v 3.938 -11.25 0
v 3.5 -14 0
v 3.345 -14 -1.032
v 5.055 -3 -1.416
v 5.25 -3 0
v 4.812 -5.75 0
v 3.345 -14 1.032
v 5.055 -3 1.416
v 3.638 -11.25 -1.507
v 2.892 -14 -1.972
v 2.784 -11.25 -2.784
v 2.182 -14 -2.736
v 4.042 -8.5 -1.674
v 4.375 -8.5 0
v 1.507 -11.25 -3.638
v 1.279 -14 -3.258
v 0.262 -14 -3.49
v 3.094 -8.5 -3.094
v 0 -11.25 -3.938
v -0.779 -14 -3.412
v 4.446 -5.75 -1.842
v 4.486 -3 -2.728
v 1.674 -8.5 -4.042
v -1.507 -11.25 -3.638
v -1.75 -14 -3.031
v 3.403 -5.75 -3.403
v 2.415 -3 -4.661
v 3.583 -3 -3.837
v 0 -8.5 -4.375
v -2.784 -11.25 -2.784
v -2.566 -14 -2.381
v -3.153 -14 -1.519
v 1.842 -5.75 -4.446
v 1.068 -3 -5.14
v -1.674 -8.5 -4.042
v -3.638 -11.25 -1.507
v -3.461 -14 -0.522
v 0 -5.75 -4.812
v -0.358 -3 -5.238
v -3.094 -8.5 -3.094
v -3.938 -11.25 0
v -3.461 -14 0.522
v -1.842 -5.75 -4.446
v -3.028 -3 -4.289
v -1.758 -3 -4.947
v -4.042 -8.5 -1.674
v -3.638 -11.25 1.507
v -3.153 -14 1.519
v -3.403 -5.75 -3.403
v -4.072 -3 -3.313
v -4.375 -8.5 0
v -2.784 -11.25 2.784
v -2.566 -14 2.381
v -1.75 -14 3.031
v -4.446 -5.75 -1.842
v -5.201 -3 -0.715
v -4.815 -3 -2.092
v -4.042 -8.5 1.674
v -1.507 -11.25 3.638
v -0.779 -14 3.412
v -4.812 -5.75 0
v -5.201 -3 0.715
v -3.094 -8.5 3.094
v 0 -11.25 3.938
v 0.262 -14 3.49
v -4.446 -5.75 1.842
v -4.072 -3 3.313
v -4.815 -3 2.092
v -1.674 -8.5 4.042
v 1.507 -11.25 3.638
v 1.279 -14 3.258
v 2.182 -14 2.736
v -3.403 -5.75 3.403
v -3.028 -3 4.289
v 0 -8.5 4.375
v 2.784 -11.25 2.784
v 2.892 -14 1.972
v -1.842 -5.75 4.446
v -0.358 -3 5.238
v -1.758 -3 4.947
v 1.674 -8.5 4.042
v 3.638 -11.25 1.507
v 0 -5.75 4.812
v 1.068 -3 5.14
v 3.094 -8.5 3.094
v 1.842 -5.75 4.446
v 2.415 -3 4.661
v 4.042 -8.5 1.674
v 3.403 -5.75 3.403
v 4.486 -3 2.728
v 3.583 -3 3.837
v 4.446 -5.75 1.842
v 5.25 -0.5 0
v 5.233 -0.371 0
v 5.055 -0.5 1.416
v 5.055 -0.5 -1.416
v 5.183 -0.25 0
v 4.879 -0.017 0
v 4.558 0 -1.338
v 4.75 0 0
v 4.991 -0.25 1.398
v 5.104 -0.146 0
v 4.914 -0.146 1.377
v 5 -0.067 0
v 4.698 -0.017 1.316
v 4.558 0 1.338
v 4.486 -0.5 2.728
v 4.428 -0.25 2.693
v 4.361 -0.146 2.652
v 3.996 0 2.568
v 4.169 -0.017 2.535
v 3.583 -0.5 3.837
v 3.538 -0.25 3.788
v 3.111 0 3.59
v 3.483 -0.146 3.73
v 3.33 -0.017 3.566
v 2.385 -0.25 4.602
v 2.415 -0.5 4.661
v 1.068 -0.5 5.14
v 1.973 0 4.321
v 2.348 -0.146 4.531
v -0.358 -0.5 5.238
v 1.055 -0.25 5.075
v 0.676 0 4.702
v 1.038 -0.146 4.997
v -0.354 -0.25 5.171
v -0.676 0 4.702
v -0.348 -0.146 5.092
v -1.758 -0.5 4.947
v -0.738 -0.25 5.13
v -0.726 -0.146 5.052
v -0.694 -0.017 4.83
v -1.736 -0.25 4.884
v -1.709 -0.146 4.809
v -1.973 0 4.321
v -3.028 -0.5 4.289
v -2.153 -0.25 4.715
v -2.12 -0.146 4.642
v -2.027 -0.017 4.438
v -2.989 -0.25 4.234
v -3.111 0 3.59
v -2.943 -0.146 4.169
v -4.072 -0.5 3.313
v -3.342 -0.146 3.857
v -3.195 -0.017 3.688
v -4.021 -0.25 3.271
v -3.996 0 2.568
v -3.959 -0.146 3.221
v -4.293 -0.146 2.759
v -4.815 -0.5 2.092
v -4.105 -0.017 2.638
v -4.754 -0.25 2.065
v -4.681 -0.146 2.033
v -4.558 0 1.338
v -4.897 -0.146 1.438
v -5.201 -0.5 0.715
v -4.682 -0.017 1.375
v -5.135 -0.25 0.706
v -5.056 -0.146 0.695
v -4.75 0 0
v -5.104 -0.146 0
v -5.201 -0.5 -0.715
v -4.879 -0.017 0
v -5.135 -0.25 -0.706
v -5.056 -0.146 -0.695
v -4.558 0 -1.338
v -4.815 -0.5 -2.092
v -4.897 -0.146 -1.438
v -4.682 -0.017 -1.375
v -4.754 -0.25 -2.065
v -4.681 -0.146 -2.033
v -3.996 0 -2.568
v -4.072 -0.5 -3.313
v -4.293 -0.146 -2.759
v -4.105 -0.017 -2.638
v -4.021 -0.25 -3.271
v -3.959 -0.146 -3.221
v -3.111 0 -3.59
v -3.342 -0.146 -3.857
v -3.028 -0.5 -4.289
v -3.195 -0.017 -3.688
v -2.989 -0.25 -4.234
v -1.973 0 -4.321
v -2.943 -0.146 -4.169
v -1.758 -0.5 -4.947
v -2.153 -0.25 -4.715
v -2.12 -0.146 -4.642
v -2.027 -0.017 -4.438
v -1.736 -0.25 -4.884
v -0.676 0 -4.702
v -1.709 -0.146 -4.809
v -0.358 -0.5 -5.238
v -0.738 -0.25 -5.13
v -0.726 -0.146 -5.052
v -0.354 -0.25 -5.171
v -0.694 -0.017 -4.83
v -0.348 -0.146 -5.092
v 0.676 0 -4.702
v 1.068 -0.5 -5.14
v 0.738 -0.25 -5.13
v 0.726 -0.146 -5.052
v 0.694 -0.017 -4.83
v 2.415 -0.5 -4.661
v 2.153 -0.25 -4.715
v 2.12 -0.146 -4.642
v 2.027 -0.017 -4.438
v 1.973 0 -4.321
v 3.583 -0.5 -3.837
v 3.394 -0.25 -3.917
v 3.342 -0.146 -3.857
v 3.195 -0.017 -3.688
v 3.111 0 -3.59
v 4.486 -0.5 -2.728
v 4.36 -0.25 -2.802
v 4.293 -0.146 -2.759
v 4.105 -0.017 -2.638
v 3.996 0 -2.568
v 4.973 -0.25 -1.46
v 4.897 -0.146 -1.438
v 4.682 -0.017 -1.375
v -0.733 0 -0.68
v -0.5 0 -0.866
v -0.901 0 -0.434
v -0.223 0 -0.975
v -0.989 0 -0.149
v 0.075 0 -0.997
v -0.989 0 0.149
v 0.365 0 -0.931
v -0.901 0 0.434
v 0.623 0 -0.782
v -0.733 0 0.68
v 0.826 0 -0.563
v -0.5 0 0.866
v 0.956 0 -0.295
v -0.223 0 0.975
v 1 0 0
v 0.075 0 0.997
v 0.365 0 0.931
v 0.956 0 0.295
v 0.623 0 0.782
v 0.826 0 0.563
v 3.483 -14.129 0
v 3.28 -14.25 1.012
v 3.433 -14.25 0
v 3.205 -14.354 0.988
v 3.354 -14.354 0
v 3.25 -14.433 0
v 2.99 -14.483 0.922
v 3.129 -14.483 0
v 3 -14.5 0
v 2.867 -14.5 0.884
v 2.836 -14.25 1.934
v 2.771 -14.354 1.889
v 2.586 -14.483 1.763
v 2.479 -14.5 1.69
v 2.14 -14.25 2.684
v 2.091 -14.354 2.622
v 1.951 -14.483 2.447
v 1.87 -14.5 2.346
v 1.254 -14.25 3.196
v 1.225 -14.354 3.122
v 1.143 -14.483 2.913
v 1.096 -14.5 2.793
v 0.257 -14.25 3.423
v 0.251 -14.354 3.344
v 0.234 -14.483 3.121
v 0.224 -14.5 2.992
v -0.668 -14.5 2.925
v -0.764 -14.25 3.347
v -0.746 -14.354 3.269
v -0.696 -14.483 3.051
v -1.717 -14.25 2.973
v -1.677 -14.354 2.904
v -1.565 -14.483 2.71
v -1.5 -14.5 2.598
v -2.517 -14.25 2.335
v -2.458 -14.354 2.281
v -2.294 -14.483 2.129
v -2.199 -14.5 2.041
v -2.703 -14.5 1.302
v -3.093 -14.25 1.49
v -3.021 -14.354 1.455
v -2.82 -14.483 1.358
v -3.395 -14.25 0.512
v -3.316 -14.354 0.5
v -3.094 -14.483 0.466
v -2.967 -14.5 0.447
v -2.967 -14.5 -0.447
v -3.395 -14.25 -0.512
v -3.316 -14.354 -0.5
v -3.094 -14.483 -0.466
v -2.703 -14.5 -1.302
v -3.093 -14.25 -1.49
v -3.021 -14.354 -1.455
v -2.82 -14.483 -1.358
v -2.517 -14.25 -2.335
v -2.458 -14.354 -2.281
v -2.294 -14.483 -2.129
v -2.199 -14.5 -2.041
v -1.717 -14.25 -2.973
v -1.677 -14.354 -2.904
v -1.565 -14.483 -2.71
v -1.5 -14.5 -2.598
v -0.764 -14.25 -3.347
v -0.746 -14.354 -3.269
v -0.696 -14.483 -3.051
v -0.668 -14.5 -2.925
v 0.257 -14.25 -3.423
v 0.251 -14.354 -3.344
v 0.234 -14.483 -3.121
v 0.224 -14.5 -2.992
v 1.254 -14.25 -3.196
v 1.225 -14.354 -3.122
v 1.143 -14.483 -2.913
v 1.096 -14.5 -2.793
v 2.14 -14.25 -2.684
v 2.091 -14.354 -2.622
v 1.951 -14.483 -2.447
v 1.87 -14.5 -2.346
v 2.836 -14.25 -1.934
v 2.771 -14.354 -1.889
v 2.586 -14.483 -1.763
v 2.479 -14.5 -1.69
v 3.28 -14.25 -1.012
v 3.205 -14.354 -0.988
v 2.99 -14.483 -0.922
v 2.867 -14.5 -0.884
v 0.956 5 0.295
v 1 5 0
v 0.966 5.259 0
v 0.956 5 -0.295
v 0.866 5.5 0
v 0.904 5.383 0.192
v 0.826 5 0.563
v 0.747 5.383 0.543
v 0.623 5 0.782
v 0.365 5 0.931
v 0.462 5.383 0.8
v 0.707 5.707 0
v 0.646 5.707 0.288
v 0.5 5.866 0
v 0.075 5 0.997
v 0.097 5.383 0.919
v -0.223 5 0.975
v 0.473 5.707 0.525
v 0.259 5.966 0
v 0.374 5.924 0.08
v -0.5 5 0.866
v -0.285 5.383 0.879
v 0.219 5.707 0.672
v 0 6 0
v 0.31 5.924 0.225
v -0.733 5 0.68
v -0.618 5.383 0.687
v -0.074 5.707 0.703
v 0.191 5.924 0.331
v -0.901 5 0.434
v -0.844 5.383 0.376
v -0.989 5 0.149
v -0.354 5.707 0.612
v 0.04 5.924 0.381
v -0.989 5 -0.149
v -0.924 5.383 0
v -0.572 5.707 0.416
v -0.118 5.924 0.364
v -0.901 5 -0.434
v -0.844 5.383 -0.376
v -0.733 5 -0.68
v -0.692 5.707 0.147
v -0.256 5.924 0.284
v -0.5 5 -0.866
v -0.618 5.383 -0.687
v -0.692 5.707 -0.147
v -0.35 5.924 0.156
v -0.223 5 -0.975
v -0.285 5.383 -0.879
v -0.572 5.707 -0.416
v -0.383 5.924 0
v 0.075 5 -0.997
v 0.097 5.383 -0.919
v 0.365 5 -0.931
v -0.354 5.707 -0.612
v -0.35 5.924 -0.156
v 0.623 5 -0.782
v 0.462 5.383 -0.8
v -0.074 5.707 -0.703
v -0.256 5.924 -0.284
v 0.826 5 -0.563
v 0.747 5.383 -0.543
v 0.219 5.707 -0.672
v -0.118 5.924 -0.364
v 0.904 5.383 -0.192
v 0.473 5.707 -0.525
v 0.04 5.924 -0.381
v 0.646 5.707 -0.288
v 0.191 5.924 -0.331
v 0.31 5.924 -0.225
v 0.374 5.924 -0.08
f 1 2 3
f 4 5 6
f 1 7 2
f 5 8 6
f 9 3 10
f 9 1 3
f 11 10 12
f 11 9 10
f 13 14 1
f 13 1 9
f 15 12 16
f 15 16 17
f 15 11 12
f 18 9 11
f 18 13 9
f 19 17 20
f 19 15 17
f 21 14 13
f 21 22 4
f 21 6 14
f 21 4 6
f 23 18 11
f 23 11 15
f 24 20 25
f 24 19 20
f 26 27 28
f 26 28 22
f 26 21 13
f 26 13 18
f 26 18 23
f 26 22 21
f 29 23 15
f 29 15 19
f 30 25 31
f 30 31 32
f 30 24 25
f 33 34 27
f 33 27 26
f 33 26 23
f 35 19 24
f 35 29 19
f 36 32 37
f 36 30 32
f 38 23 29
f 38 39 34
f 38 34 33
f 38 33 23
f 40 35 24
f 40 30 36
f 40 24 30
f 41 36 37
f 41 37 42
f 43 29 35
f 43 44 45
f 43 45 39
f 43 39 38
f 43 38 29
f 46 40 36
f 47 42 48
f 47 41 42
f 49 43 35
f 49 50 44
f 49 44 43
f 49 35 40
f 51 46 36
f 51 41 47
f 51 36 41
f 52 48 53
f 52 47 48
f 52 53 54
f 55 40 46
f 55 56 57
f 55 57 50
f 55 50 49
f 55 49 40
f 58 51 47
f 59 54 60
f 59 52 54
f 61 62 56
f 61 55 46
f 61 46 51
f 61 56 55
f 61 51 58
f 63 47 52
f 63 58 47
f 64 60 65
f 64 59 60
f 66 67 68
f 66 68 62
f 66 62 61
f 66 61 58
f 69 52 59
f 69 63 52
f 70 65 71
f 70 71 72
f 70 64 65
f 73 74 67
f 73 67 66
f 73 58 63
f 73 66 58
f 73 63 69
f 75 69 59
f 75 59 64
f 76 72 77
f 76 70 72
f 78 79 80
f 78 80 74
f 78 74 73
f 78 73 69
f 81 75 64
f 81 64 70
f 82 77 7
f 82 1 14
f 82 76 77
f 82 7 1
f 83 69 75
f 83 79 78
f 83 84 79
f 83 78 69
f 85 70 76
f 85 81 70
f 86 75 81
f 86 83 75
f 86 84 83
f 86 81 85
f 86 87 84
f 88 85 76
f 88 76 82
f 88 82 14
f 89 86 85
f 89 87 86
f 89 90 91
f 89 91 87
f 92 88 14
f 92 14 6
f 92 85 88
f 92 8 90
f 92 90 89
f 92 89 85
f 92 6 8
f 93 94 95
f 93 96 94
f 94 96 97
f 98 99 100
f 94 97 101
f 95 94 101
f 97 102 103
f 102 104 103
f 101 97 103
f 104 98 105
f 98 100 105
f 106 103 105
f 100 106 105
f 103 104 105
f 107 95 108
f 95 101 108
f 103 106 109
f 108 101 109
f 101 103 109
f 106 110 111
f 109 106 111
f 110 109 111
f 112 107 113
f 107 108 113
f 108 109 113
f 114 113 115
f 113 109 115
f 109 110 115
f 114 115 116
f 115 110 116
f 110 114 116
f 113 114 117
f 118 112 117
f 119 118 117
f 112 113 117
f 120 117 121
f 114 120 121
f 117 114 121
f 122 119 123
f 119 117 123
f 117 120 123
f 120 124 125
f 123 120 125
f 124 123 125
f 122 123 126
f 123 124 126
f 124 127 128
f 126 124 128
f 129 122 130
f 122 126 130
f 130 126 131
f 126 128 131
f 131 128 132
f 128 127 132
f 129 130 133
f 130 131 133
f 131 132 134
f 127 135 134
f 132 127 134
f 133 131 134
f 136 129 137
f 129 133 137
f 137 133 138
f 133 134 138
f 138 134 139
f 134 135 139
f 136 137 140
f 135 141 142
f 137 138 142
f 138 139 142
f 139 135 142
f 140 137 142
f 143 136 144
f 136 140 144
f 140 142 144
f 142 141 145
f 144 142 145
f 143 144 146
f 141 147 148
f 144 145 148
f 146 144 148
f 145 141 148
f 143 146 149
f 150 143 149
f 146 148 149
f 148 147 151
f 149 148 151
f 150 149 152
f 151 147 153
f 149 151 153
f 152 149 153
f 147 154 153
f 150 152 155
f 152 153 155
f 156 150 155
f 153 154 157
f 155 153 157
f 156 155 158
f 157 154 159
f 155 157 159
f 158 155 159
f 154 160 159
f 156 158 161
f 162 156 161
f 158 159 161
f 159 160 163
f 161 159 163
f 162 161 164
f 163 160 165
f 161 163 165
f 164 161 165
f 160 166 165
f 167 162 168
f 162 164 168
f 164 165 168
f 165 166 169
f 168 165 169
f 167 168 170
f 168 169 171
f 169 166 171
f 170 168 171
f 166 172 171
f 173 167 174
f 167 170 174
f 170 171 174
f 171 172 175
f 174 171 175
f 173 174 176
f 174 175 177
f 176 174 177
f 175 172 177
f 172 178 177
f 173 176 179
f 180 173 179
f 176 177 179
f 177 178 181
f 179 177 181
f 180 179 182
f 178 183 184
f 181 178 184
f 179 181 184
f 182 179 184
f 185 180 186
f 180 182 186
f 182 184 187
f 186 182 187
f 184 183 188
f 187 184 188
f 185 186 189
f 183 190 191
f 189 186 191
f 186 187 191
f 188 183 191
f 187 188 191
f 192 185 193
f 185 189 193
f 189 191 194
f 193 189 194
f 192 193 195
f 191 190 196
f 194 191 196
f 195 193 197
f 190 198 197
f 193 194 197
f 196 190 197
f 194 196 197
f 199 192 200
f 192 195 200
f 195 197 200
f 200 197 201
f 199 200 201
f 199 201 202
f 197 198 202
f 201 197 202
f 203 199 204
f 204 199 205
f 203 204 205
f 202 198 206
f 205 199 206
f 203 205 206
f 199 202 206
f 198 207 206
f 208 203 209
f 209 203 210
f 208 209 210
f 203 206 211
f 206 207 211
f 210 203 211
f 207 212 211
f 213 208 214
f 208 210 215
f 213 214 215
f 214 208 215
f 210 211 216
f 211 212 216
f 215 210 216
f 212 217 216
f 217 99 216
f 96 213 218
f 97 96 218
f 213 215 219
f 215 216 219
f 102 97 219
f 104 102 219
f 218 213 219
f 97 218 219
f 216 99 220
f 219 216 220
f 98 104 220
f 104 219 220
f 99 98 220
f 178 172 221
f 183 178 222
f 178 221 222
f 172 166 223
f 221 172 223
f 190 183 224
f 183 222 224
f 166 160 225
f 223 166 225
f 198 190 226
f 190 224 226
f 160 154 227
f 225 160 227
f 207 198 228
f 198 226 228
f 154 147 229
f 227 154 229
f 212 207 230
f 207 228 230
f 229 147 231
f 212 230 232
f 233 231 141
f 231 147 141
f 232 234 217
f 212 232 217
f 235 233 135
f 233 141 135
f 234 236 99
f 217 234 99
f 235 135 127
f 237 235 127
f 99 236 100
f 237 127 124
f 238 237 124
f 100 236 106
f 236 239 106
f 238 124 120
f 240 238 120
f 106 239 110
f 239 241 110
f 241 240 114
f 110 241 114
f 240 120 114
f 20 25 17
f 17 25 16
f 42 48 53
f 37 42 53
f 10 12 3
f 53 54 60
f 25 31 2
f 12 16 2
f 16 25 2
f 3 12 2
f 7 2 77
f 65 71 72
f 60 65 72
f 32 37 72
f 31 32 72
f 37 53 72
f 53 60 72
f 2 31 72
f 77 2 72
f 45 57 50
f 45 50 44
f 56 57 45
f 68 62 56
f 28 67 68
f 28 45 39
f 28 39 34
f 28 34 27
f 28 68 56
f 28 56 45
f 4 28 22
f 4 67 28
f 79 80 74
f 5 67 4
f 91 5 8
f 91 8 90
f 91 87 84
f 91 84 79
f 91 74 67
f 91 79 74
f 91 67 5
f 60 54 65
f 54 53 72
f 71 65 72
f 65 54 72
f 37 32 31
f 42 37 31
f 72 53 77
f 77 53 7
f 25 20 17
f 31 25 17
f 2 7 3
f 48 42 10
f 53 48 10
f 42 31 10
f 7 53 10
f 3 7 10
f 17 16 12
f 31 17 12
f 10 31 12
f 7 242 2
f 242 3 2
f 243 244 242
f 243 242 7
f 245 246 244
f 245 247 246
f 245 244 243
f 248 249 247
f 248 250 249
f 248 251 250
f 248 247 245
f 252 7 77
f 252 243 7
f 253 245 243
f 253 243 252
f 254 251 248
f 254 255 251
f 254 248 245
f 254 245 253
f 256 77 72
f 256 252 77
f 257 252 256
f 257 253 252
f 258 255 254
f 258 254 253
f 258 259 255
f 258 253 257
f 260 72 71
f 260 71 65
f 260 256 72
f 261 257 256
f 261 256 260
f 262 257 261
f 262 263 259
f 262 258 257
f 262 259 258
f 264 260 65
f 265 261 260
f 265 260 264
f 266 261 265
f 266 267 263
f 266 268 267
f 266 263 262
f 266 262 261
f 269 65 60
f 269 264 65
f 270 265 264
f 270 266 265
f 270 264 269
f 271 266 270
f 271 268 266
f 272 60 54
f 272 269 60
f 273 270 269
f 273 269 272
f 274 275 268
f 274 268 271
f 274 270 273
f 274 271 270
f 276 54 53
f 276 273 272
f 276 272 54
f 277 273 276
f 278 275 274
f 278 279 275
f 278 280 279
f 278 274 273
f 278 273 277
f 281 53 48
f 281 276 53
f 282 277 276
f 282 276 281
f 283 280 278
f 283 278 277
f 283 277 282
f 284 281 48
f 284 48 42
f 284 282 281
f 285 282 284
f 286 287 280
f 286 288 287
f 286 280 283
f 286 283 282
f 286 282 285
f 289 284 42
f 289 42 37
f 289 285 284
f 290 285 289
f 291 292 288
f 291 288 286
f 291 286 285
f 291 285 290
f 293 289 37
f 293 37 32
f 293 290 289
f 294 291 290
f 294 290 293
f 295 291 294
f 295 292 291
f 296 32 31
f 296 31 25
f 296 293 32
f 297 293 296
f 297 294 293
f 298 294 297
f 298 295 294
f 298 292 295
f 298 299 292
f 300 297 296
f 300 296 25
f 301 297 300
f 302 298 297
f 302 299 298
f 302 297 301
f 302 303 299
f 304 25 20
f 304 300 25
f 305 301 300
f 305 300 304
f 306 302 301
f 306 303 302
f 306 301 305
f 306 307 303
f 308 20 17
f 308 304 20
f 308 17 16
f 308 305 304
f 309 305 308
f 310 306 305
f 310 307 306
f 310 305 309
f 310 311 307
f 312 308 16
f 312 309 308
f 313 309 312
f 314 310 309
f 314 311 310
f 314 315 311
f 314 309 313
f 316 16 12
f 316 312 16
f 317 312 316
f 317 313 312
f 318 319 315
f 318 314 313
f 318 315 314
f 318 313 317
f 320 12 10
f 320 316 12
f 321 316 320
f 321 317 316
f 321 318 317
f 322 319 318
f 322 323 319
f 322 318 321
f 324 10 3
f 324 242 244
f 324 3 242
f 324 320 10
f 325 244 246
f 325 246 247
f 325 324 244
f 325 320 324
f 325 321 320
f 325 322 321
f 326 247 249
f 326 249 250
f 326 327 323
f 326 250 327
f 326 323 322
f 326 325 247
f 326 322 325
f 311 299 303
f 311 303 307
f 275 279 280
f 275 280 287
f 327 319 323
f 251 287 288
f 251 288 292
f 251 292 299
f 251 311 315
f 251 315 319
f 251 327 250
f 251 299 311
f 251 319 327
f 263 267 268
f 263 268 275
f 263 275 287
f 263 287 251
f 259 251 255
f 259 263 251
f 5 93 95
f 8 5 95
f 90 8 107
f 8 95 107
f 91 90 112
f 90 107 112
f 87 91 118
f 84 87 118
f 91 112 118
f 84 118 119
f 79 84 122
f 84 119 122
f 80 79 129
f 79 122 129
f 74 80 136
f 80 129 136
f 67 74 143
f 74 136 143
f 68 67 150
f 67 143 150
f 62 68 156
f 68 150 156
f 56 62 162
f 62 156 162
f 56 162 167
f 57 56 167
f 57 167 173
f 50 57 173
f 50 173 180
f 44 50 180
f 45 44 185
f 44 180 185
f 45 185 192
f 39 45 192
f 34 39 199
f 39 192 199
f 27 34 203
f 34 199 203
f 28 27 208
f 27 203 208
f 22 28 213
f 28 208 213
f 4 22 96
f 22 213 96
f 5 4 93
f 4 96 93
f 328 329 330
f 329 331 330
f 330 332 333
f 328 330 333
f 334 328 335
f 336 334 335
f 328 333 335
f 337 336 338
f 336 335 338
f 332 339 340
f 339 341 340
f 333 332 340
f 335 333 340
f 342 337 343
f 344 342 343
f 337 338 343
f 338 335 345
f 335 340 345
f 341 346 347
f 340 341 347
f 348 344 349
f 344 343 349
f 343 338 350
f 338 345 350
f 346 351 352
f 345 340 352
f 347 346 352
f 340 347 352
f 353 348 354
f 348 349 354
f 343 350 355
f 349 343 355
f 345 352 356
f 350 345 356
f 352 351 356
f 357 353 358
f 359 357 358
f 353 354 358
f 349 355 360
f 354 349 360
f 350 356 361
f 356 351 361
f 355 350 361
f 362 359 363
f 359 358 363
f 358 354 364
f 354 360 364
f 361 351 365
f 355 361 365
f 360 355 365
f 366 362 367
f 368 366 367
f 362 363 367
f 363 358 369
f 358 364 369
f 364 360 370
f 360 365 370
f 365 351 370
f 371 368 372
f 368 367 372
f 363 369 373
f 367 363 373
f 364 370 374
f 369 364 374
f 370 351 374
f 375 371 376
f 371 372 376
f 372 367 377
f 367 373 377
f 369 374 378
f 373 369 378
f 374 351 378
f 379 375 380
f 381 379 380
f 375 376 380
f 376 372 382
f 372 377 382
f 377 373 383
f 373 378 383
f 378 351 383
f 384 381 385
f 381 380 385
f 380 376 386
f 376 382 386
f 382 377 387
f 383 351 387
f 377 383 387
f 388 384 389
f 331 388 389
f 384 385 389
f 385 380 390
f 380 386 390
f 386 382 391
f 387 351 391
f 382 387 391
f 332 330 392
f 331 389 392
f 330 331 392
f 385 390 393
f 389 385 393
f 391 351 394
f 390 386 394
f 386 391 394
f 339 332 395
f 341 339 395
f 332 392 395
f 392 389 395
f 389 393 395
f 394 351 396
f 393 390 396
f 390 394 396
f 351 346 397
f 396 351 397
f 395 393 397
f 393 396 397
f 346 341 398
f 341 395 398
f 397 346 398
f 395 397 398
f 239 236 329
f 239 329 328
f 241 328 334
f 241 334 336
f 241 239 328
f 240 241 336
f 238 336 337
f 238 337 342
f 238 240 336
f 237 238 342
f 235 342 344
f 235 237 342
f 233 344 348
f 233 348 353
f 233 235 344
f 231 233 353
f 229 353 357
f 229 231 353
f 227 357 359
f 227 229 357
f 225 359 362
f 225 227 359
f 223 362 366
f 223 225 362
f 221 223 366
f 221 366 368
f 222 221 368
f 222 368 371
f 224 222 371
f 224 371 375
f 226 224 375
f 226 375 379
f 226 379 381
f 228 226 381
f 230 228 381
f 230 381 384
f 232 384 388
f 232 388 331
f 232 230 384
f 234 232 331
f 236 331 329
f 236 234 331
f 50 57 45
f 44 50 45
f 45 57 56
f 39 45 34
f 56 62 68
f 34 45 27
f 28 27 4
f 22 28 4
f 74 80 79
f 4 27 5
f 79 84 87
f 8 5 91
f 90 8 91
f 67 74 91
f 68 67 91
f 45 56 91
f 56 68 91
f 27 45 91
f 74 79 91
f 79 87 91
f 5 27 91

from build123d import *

# Parameters (mm, degrees)
F2_R      = 3.5
F3_DEPTH  = 0.5
F0_R      = 5.25
F4_DEPTH  = 3
F5_R      = 1
F6_DEPTH  = 6
F3_FACE_R = 3.5
F4_FACE_R = 5.25
F8_R      = 0.49999
F9_R      = 0.5
F10_R     = 1


# Not quite as in the source:
# - a fillet or chamfer is up to 0.001 mm smaller than in the source, because OpenCascade refuses the exact size


with BuildPart() as f3:
    # F2 (on offset) → F3 (new body)
    with BuildSketch(Plane.XZ.offset(14)):
        Circle(F2_R)
    extrude(amount=F3_DEPTH)

    # F8 (radius 0.5 in the source; OpenCascade refuses exactly that, so slightly less here)
    f8_edges = [f3.edges().sort_by_distance(p)[0] for p in [
        (-3.5, -14.5, 0),
    ]]
    fillet(f8_edges, radius=F8_R)


with BuildPart() as f4:
    # F0 (on Front) → F4 (new body)
    with BuildSketch(Plane.XZ):
        Circle(F0_R)
    extrude(amount=F4_DEPTH)

    # F5 (on Front) → F6 (join)
    with BuildSketch(Plane.XZ):
        Circle(F5_R)
    extrude(amount=-F6_DEPTH)

    # F9
    f9_edges = [f4.edges().sort_by_distance(p)[0] for p in [
        (-5.25, 0, 0),
    ]]
    fillet(f9_edges, radius=F9_R)

    # F10
    f10_edges = [f4.edges().sort_by_distance(p)[0] for p in [
        (-1, 6, 0),
    ]]
    fillet(f10_edges, radius=F10_R)


with BuildPart() as f7:
    # F3_face (on face) → F7 section 0
    with BuildSketch(Plane(origin=(0, -14, 0), x_dir=(1, 0, 0), z_dir=(0, 1, 0))):
        Circle(F3_FACE_R)
    # F4_face (on face) → F7 section 1
    with BuildSketch(Plane.XZ.offset(3)):
        Circle(F4_FACE_R)
    loft()


solid = Compound([f3.part, f4.part, f7.part])
